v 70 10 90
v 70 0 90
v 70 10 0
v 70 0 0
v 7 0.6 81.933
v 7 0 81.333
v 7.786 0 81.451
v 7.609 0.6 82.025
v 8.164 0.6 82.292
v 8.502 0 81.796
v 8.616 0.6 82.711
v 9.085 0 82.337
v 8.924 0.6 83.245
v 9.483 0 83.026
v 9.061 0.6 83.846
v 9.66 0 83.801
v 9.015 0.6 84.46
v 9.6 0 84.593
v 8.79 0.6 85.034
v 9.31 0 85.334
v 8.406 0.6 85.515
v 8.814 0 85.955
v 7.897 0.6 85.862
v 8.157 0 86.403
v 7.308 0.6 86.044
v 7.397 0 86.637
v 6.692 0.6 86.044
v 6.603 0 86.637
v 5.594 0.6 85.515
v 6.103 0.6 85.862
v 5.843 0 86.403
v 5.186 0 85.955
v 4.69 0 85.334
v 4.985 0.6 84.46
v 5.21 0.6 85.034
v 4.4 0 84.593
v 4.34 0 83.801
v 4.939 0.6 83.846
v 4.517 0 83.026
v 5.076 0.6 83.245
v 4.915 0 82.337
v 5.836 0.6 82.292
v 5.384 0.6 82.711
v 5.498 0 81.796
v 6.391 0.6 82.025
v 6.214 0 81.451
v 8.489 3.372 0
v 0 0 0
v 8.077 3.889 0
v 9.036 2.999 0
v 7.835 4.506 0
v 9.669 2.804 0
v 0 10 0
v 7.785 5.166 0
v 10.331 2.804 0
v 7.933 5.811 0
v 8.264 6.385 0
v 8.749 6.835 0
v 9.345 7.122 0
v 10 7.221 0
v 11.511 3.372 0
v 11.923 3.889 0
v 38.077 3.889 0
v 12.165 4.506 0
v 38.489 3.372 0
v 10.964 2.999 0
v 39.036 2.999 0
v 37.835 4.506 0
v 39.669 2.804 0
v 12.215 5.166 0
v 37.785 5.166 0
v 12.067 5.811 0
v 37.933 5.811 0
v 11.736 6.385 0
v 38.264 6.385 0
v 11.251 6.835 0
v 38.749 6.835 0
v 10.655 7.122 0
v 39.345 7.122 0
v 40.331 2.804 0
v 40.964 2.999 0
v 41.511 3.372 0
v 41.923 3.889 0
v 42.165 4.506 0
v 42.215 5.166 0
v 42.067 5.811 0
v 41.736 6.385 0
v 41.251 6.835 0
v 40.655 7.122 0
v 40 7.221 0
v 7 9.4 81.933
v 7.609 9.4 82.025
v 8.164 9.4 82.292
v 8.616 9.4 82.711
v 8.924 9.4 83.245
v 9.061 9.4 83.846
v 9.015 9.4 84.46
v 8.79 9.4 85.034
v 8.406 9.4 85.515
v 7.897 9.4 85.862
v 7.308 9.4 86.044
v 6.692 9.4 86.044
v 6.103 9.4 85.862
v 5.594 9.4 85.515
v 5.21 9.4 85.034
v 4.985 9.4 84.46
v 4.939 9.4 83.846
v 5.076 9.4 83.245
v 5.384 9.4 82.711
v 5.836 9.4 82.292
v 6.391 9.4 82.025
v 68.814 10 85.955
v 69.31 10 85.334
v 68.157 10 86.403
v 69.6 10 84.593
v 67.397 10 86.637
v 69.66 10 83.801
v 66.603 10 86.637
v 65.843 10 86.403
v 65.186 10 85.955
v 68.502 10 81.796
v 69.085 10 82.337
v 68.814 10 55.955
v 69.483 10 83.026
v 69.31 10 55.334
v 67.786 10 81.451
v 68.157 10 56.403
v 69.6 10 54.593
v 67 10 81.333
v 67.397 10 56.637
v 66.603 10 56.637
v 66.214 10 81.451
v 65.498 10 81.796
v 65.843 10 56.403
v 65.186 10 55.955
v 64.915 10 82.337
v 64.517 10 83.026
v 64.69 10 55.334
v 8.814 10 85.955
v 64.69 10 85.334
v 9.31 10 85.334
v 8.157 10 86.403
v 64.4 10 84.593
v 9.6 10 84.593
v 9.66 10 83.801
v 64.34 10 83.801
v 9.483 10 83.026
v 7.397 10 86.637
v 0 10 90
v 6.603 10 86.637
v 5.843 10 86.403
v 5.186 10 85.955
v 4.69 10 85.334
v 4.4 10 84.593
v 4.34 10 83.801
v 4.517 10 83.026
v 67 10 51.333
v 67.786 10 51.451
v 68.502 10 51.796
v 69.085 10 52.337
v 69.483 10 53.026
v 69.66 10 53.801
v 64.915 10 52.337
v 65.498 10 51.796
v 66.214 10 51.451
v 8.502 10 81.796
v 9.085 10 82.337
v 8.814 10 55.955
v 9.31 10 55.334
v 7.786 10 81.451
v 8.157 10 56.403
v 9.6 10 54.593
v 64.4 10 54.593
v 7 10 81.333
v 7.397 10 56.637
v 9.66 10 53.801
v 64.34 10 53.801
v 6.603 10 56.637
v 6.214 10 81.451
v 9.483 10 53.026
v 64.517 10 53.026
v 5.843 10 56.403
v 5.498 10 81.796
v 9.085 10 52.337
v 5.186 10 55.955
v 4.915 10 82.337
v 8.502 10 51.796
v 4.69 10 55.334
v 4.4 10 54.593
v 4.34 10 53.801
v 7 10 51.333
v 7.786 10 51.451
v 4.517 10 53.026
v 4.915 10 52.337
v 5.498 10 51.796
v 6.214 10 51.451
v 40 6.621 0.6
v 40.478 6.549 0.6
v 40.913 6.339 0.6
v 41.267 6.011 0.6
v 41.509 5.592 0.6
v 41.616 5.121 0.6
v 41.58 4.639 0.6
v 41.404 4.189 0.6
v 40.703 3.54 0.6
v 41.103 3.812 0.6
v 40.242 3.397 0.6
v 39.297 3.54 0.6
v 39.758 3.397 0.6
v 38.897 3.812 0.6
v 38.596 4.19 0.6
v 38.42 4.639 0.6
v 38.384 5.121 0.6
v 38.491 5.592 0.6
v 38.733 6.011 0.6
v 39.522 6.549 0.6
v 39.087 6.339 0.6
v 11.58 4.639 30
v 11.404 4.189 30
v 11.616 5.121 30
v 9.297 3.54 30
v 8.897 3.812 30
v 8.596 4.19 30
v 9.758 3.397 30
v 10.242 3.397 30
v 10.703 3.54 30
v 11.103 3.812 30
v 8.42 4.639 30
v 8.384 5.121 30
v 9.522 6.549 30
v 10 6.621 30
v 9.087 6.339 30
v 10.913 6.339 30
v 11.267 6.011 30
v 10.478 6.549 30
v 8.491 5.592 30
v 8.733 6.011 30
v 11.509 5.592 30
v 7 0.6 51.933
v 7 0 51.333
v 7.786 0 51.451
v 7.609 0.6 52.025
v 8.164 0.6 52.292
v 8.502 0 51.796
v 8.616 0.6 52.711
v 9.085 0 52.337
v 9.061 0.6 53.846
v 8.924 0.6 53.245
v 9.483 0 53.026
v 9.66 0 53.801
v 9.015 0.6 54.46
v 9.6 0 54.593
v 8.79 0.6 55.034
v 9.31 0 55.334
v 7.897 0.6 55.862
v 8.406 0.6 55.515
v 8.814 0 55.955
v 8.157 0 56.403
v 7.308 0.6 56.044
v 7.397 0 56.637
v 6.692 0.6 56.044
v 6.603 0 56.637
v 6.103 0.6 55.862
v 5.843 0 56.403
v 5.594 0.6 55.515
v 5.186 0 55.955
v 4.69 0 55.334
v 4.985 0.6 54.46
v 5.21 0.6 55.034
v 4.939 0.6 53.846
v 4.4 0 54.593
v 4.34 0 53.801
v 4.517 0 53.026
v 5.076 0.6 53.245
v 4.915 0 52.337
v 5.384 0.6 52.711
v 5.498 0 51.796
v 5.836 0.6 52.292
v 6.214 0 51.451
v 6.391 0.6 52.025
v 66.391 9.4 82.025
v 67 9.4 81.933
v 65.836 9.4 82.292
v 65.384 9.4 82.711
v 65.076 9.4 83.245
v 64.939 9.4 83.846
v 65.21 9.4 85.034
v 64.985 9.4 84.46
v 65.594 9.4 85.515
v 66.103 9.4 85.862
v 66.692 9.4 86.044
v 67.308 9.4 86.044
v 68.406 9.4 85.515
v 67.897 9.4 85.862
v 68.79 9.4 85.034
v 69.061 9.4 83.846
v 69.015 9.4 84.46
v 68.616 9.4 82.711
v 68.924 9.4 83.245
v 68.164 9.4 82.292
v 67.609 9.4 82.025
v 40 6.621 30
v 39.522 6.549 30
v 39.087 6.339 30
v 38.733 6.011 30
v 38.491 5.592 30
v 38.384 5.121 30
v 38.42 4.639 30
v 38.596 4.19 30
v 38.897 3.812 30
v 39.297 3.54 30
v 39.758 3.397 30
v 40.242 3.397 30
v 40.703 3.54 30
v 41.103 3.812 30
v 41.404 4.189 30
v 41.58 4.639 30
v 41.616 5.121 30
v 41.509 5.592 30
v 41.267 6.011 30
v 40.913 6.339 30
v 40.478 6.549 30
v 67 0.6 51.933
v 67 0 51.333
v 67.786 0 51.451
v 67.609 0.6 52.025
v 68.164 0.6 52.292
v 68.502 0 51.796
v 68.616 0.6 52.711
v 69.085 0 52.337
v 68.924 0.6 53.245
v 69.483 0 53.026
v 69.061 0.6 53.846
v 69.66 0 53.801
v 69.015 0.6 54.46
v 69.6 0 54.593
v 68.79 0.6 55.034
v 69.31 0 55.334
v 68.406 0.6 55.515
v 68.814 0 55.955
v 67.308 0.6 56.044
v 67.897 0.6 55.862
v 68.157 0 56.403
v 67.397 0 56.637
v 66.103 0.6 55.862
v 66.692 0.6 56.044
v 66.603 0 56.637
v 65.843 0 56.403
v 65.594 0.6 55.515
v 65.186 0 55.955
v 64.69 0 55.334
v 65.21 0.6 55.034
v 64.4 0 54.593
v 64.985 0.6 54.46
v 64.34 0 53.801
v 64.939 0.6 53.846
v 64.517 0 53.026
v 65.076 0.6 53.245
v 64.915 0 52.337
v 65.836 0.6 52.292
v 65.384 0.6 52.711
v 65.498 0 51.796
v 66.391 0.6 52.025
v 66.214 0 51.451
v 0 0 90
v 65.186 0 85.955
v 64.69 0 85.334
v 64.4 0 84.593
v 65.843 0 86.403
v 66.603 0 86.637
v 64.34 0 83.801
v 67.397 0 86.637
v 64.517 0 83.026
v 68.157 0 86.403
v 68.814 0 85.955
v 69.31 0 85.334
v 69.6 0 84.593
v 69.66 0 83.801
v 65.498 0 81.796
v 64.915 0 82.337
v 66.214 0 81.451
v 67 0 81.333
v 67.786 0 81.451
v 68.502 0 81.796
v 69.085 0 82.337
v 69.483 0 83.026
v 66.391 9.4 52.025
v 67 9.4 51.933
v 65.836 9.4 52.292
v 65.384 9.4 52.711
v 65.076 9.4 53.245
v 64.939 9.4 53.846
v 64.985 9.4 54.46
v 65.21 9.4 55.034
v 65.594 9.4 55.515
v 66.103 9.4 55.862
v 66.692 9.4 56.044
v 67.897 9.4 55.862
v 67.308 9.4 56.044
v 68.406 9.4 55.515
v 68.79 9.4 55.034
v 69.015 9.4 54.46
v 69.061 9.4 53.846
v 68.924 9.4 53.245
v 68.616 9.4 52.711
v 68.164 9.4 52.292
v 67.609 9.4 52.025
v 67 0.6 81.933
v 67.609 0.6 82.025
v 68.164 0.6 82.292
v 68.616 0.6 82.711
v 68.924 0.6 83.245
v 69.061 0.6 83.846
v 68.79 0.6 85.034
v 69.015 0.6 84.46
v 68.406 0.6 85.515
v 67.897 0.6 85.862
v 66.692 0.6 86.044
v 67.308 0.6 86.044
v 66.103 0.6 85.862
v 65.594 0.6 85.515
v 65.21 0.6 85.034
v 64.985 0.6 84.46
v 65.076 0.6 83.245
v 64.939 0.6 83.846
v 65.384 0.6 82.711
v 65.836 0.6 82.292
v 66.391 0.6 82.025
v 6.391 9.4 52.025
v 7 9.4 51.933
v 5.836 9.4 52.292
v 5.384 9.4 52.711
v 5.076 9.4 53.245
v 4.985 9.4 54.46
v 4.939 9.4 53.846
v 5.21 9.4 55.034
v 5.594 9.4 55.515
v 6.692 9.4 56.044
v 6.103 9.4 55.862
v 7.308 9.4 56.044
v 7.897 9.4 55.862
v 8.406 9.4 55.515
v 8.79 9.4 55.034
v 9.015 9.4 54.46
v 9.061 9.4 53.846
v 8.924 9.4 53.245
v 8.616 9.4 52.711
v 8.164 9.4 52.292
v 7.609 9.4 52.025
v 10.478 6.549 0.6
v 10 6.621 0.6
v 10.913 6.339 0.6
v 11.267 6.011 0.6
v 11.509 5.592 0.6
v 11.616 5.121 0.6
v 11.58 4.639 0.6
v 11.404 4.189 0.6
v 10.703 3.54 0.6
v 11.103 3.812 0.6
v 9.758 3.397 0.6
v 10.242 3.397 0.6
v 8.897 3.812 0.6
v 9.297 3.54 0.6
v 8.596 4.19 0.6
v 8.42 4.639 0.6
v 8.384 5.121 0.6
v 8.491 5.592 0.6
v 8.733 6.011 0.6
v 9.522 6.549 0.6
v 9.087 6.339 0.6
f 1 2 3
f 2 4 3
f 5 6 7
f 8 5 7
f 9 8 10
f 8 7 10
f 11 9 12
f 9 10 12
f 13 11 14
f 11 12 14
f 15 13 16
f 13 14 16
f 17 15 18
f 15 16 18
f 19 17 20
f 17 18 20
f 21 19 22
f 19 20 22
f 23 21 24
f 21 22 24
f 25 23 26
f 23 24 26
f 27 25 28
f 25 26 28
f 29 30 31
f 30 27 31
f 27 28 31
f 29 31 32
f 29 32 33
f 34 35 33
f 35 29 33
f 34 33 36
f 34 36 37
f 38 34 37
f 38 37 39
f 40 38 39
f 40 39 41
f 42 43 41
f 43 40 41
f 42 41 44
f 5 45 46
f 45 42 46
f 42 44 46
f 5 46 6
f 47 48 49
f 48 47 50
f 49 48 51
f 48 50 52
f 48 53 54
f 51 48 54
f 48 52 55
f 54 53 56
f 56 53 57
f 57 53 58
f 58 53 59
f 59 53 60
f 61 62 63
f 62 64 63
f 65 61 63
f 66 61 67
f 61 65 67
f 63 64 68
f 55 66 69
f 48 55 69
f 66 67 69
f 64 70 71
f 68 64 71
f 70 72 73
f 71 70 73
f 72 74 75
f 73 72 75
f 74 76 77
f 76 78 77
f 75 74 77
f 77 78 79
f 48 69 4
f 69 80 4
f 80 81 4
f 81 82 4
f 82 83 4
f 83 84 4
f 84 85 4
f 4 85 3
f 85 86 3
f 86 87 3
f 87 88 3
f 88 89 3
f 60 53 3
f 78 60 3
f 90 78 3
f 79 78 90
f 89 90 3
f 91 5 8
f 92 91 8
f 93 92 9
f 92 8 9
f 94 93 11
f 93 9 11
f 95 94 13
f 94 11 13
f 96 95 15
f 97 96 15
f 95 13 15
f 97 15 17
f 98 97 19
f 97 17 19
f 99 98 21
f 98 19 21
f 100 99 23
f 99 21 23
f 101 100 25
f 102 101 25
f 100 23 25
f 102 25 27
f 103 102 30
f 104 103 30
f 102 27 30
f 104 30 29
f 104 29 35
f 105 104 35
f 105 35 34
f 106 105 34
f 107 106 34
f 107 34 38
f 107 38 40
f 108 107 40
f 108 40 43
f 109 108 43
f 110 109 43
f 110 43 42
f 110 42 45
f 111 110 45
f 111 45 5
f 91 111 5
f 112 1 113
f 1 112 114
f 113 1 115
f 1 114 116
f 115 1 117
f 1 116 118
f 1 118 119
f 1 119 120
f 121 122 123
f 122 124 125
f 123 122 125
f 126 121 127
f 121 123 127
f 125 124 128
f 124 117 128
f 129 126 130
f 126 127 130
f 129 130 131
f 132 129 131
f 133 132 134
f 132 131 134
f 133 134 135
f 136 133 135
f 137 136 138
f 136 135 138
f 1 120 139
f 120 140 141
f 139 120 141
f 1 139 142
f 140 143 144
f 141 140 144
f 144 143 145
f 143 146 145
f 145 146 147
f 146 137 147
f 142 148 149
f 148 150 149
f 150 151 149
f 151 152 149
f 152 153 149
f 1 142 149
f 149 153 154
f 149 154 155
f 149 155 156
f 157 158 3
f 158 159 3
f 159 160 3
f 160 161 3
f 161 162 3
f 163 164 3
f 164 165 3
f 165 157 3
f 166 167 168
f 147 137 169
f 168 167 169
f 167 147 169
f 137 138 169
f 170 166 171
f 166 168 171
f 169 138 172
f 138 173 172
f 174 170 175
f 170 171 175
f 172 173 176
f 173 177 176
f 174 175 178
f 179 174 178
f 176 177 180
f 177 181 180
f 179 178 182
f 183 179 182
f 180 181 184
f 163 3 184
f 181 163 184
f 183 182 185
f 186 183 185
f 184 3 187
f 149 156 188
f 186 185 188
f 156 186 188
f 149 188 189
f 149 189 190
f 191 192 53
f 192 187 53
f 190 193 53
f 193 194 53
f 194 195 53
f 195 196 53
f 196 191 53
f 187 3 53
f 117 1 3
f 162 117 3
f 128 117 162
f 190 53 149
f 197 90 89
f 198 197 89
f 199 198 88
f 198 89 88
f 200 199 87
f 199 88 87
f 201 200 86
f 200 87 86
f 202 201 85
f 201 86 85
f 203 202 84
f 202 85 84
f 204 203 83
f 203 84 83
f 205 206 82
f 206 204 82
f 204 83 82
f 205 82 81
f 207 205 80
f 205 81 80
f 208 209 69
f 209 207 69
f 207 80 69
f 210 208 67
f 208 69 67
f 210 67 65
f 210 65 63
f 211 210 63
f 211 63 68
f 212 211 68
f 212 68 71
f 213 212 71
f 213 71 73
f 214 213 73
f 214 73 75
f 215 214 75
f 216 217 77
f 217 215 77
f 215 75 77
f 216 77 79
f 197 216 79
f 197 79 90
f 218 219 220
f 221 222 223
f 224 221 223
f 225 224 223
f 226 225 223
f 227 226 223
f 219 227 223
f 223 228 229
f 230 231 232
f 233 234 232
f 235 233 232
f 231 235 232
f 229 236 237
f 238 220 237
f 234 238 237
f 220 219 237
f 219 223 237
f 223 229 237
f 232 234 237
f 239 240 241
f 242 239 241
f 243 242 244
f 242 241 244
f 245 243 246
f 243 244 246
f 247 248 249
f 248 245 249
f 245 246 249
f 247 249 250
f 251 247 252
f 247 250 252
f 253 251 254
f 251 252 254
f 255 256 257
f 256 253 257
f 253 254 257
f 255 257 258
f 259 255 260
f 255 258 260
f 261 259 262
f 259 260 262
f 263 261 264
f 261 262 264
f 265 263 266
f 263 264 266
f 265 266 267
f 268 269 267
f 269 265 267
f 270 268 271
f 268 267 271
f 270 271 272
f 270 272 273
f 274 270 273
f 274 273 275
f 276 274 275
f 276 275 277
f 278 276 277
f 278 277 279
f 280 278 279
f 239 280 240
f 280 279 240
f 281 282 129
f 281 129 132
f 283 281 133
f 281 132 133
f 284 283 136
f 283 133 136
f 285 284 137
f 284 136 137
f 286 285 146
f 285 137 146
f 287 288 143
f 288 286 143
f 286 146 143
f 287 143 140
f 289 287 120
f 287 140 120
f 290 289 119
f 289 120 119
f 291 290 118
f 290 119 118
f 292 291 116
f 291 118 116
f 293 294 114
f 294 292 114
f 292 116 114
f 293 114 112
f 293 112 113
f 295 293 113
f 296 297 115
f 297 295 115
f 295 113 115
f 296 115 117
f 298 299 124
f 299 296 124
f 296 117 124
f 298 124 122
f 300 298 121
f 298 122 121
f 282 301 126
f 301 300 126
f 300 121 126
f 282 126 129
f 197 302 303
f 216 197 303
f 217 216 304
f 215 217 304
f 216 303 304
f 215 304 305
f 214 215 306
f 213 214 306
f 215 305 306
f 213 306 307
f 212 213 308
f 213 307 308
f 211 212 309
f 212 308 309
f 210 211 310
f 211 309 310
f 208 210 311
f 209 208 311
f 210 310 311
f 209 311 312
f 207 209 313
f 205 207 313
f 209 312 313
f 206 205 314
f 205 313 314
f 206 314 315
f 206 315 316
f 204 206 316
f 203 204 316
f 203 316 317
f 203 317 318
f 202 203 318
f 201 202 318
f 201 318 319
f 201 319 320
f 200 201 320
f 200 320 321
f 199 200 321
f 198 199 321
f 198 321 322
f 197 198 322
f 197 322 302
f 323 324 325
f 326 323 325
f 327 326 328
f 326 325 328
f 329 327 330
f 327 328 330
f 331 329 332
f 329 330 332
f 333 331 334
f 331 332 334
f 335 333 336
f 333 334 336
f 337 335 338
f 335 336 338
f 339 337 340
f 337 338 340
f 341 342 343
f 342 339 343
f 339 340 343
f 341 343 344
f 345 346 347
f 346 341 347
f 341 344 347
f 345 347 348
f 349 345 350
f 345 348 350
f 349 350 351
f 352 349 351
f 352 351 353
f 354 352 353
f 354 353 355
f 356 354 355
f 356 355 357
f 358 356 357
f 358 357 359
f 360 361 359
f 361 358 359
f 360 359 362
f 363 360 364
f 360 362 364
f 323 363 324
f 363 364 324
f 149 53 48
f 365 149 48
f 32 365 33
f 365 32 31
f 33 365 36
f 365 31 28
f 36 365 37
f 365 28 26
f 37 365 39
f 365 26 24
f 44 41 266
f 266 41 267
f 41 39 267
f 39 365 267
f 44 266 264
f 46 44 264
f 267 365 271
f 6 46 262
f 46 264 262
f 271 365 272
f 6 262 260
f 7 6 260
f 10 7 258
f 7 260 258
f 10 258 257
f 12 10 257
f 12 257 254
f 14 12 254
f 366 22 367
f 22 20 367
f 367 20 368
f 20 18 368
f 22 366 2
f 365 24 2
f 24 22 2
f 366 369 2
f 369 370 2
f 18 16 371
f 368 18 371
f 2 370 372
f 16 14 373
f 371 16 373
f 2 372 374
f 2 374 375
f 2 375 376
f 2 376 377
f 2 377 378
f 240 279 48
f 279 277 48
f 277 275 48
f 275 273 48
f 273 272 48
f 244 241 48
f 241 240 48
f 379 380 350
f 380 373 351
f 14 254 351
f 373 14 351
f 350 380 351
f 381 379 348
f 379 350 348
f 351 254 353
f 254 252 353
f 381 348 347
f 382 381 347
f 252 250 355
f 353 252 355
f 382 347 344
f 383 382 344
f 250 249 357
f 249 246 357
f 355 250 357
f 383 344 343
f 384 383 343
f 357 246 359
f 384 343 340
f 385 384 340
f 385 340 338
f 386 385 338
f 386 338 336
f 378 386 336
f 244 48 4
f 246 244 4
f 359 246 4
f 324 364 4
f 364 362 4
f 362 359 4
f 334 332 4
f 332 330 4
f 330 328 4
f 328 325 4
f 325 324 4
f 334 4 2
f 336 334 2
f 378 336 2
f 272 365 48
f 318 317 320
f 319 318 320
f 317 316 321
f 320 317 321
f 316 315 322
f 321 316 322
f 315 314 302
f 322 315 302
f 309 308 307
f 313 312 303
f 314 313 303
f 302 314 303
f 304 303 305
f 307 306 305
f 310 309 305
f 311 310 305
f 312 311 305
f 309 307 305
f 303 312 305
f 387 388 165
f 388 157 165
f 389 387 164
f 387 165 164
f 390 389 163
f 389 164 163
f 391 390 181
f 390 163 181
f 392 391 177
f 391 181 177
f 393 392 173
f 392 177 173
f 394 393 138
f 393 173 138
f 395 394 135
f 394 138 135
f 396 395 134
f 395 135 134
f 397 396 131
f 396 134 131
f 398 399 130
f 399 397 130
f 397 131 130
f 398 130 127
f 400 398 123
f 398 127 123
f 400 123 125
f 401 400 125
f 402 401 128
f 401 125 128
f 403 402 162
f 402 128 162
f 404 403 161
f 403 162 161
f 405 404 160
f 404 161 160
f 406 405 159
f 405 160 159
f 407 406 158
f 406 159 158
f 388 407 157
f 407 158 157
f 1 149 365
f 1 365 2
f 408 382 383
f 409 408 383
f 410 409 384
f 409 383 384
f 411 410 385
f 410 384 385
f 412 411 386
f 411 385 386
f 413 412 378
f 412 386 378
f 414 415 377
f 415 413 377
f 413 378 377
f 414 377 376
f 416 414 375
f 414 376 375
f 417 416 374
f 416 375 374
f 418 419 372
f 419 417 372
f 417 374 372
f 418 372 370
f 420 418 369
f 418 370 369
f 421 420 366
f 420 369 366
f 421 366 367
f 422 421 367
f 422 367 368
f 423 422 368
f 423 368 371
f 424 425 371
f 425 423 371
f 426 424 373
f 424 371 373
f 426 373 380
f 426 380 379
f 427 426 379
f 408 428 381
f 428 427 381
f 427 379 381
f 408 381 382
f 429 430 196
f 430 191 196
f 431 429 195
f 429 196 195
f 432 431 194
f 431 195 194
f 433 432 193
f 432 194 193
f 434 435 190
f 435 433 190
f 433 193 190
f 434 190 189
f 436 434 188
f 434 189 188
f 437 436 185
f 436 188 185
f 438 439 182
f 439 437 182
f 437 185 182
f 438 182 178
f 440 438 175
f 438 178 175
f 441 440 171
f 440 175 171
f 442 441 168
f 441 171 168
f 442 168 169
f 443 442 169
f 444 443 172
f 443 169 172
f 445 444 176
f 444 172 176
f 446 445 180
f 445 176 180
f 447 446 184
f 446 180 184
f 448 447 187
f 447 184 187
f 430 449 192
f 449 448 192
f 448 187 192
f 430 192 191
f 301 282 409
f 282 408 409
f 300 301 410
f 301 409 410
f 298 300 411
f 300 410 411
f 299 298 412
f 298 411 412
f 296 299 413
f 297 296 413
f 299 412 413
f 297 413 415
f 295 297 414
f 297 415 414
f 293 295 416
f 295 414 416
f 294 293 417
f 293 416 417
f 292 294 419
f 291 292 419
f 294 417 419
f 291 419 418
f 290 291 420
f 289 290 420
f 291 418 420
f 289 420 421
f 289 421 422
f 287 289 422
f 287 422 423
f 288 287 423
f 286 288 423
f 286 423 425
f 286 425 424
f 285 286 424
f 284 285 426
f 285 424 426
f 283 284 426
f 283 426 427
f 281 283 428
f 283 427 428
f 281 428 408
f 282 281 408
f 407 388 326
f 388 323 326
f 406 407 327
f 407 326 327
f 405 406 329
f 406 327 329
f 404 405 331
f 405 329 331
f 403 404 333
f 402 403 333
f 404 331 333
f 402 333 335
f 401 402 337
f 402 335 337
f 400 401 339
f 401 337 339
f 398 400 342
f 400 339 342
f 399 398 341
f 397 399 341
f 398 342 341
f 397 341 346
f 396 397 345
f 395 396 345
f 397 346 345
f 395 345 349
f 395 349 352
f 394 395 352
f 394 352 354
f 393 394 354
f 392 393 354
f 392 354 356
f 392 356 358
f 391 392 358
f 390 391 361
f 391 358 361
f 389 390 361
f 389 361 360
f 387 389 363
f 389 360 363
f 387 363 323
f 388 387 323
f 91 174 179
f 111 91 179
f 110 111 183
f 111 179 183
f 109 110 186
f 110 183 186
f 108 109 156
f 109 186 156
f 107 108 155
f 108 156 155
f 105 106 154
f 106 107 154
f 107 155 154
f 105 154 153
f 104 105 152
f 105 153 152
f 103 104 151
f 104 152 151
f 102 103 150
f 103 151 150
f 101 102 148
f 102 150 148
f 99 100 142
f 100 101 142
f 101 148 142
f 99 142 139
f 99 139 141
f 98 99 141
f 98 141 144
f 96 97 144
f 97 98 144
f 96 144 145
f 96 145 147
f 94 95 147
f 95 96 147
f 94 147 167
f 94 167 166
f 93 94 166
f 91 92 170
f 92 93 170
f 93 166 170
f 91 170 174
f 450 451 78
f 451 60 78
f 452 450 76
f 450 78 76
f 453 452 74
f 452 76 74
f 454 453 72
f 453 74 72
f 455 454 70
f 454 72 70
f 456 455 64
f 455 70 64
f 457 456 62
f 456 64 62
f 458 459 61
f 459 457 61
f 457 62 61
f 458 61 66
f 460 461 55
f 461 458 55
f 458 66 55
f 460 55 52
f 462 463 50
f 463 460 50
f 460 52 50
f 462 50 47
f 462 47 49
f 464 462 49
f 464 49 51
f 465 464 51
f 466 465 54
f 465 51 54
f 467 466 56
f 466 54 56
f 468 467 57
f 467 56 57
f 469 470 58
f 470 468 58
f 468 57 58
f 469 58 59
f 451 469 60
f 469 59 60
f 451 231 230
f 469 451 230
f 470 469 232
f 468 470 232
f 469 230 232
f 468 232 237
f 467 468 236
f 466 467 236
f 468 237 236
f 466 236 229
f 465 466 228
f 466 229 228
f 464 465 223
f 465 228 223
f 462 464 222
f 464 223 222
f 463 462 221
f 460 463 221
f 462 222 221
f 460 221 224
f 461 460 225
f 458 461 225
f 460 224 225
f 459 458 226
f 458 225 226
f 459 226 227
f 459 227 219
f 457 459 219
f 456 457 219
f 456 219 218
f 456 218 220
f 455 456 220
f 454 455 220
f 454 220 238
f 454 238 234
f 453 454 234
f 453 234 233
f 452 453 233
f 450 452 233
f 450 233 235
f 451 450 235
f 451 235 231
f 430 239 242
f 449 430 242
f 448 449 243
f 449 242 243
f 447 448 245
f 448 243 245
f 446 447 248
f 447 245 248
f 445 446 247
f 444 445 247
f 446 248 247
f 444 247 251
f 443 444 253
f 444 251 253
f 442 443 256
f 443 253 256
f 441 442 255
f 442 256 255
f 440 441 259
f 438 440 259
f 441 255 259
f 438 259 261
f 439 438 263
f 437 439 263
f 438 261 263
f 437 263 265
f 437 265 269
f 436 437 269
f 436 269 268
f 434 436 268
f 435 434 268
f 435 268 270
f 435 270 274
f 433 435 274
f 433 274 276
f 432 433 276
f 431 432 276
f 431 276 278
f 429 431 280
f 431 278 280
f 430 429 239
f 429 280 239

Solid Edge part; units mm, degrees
sketch "Sketch1" plane through (0, 0, 0) normal (0, 0, 1) x (1, 0, 0)
  line L0 (70, 10) -> (0, 10)
  line L1 (0, 10) -> (0, 0)
  line L2 (0, 0) -> (70, 0)
  line L3 (70, 0) -> (70, 10)
extrude "Protrusion1" add sketch "Sketch1" along normal blind 90
hole "Hole_1" at (7, 0, 54) direction (0, 1, 0) diameter 4.134 end up to next start chamfer 0.6 start chamfer angle 45 end chamfer 0.6 end chamfer angle 45 thread major 5 thread length 2
hole "Hole1" at (67, 0, 54) direction (0, 1, 0) diameter 4.134 end up to next start chamfer 0.6 start chamfer angle 45 end chamfer 0.6 end chamfer angle 45 thread major 5 thread length 2
hole "Hole2" at (67, 0, 84) direction (0, 1, 0) diameter 4.134 end up to next start chamfer 0.6 start chamfer angle 45 end chamfer 0.6 end chamfer angle 45 thread major 5 thread length 2
hole "Hole3" at (7, 0, 84) direction (0, 1, 0) diameter 4.134 end up to next start chamfer 0.6 start chamfer angle 45 end chamfer 0.6 end chamfer angle 45 thread major 5 thread length 2
hole "Hole_5" at (10, 5, 0) direction (0, 0, 1) diameter 3.242 depth 30 start chamfer 0.6 start chamfer angle 45 thread major 4 thread length 2
hole "Hole4" at (40, 5, 0) direction (0, 0, 1) diameter 3.242 depth 30 start chamfer 0.6 start chamfer angle 45 thread major 4 thread length 2
